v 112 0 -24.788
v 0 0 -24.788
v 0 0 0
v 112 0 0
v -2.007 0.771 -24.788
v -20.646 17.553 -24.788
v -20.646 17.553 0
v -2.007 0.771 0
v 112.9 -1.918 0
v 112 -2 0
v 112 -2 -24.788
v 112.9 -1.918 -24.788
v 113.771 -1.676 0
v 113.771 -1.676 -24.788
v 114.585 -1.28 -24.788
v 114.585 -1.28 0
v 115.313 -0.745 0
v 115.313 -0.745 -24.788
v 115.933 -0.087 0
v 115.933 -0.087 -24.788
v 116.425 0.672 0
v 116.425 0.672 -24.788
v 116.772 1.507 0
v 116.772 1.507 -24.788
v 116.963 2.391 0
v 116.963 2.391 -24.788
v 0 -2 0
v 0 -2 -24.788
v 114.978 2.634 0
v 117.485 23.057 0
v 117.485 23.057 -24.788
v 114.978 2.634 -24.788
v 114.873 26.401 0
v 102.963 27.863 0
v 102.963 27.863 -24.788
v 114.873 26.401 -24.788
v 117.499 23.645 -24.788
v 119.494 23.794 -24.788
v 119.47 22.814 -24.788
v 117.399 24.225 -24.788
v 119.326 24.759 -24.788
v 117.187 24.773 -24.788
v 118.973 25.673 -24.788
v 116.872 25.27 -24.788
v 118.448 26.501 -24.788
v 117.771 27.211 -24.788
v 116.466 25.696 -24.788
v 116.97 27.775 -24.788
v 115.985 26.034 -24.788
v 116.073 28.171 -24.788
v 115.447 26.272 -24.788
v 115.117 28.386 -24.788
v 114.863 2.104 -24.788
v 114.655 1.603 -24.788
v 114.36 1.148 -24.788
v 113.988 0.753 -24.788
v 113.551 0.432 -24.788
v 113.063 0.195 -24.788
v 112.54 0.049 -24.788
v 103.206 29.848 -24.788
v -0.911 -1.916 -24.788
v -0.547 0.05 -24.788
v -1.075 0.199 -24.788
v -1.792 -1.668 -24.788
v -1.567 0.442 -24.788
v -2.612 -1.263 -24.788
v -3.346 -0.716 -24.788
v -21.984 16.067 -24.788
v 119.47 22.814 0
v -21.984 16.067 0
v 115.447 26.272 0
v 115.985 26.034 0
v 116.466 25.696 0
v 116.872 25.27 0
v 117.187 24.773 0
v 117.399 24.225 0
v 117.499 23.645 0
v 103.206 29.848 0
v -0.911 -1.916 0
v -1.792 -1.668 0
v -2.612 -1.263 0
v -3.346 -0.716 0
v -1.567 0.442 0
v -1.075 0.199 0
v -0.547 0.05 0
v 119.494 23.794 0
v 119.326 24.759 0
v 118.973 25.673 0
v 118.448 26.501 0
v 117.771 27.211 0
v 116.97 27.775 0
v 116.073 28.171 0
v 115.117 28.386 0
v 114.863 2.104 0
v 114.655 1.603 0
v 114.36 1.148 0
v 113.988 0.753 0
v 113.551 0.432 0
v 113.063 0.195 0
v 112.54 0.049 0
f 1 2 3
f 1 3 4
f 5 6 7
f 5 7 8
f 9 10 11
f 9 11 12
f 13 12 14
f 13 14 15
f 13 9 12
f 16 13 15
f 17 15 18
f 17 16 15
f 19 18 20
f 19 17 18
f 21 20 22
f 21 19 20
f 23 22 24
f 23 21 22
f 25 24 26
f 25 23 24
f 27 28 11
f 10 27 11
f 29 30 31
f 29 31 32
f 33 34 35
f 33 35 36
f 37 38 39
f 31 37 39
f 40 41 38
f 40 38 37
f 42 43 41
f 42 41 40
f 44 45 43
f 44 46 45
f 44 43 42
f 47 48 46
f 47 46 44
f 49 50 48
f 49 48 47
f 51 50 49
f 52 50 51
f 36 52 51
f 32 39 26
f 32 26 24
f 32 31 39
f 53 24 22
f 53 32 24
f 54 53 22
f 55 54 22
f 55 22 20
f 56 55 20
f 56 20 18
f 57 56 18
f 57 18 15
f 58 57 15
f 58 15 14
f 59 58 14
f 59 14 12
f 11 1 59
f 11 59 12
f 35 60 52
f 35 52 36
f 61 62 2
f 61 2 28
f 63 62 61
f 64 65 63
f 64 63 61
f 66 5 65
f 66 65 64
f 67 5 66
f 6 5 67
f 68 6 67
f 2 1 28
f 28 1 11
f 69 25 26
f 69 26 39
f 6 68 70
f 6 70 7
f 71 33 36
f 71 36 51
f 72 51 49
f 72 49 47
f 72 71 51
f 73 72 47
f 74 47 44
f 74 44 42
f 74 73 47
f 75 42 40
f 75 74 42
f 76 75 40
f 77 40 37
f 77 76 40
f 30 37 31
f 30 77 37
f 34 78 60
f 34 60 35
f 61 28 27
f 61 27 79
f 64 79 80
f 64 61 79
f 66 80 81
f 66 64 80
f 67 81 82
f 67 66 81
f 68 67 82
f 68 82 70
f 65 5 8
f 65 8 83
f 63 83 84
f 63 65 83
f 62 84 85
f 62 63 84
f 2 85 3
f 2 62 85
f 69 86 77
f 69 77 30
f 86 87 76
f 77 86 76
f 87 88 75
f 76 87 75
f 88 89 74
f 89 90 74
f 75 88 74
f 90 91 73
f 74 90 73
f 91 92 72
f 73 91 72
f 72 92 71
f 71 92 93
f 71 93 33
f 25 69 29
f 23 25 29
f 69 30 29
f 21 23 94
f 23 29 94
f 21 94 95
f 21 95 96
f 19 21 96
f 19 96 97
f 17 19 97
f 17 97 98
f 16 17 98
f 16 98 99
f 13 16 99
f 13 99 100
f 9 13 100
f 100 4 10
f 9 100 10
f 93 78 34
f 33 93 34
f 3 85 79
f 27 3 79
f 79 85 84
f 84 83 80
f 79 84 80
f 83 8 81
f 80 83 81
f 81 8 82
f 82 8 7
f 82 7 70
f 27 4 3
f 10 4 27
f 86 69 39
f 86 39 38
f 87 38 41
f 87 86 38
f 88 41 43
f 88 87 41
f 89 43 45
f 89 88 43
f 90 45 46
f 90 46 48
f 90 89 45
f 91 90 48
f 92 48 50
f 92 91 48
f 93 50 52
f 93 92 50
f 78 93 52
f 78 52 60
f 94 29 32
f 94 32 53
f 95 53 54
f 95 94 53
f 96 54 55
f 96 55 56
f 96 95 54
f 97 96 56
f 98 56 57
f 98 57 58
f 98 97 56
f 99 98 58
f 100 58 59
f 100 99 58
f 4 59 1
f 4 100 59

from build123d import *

# Parameters (mm, degrees)
SKETCH_1_W             = 112
SKETCH_1_H             = 24.788135593
SM_BASE_FLANGE_1_DEPTH = 2
SM_EDGE_FLANGE_1_DEPTH = 24.788135593
SM_EDGE_FLANGE_2_DEPTH = 24.788135593
SM_EDGE_FLANGE_3_DEPTH = 24.788135593


# Sheet-metal steps are written as plain solids
with BuildPart() as part:
    # Sketch 1 → Базовая кромка1 (new body)
    with BuildSketch(Plane(origin=(0, 0, 0), x_dir=(1, 0, 0), z_dir=(0, 1, 0))):
        with Locations((56, 12.394067796)):
            Rectangle(SKETCH_1_W, SKETCH_1_H)
    extrude(amount=-SM_BASE_FLANGE_1_DEPTH)

    # Ребро-кромка1 section (across the edge) → Ребро-кромка1 (add)
    with BuildSketch(Plane(origin=(114.654175794, 0, 0), x_dir=(-0.9925461516413217, 0.12186934340515113, 0), z_dir=(0, 0, -1))):
        with BuildLine():
            Line((-2, 2.654175794), (-2, 23.230549471))
            Line((-2, 23.230549471), (0, 23.230549471))
            Line((0, 23.230549471), (0, 2.654175794))
            ThreePointArc((0, 2.654175794), (0.753132838, 0.666315649), (2.63439197, -0.323462661))
            Line((2.63439197, -0.323462661), (2.390653283, -2.308554965))
            ThreePointArc((2.390653283, -2.308554965), (-0.744778604, -0.658924447), (-2, 2.654175794))
        make_face()
    extrude(amount=SM_EDGE_FLANGE_1_DEPTH)

    # Ребро-кромка2 section (across the edge) → Ребро-кромка2 (add)
    with BuildSketch(Plane(origin=(117.850875635, 26.035030933, 0), x_dir=(-0.12186934340515466, -0.9925461516413212, 0), z_dir=(0, 0, -1))):
        with BuildLine():
            Line((-2, 3), (-2, 15))
            Line((-2, 15), (0, 15))
            Line((0, 15), (0, 3))
            ThreePointArc((0, 3), (0.878679656, 0.878679656), (3, 0))
            Line((3, 0), (3, -2))
            ThreePointArc((3, -2), (-0.535533906, -0.535533906), (-2, 3))
        make_face()
    extrude(amount=SM_EDGE_FLANGE_2_DEPTH)

    # Ребро-кромка3 section (across the edge) → Ребро-кромка3 (add)
    with BuildSketch(Plane(origin=(-1.151592105, 0, -24.788135593), x_dir=(0.6691306063588548, 0.7431448254773974, 0), z_dir=(0, 0, 1))):
        with BuildLine():
            Line((-2, 1.151592105), (-2, 26.23227193))
            Line((-2, 26.23227193), (0, 26.23227193))
            Line((0, 26.23227193), (0, 1.151592105))
            ThreePointArc((0, 1.151592105), (0.199258721, 0.076488256), (0.770565524, -0.855799714))
            Line((0.770565524, -0.855799714), (-0.715724127, -2.194060927))
            ThreePointArc((-0.715724127, -2.194060927), (-1.667902132, -0.640247643), (-2, 1.151592105))
        make_face()
    extrude(amount=SM_EDGE_FLANGE_3_DEPTH)


solid = part.part
